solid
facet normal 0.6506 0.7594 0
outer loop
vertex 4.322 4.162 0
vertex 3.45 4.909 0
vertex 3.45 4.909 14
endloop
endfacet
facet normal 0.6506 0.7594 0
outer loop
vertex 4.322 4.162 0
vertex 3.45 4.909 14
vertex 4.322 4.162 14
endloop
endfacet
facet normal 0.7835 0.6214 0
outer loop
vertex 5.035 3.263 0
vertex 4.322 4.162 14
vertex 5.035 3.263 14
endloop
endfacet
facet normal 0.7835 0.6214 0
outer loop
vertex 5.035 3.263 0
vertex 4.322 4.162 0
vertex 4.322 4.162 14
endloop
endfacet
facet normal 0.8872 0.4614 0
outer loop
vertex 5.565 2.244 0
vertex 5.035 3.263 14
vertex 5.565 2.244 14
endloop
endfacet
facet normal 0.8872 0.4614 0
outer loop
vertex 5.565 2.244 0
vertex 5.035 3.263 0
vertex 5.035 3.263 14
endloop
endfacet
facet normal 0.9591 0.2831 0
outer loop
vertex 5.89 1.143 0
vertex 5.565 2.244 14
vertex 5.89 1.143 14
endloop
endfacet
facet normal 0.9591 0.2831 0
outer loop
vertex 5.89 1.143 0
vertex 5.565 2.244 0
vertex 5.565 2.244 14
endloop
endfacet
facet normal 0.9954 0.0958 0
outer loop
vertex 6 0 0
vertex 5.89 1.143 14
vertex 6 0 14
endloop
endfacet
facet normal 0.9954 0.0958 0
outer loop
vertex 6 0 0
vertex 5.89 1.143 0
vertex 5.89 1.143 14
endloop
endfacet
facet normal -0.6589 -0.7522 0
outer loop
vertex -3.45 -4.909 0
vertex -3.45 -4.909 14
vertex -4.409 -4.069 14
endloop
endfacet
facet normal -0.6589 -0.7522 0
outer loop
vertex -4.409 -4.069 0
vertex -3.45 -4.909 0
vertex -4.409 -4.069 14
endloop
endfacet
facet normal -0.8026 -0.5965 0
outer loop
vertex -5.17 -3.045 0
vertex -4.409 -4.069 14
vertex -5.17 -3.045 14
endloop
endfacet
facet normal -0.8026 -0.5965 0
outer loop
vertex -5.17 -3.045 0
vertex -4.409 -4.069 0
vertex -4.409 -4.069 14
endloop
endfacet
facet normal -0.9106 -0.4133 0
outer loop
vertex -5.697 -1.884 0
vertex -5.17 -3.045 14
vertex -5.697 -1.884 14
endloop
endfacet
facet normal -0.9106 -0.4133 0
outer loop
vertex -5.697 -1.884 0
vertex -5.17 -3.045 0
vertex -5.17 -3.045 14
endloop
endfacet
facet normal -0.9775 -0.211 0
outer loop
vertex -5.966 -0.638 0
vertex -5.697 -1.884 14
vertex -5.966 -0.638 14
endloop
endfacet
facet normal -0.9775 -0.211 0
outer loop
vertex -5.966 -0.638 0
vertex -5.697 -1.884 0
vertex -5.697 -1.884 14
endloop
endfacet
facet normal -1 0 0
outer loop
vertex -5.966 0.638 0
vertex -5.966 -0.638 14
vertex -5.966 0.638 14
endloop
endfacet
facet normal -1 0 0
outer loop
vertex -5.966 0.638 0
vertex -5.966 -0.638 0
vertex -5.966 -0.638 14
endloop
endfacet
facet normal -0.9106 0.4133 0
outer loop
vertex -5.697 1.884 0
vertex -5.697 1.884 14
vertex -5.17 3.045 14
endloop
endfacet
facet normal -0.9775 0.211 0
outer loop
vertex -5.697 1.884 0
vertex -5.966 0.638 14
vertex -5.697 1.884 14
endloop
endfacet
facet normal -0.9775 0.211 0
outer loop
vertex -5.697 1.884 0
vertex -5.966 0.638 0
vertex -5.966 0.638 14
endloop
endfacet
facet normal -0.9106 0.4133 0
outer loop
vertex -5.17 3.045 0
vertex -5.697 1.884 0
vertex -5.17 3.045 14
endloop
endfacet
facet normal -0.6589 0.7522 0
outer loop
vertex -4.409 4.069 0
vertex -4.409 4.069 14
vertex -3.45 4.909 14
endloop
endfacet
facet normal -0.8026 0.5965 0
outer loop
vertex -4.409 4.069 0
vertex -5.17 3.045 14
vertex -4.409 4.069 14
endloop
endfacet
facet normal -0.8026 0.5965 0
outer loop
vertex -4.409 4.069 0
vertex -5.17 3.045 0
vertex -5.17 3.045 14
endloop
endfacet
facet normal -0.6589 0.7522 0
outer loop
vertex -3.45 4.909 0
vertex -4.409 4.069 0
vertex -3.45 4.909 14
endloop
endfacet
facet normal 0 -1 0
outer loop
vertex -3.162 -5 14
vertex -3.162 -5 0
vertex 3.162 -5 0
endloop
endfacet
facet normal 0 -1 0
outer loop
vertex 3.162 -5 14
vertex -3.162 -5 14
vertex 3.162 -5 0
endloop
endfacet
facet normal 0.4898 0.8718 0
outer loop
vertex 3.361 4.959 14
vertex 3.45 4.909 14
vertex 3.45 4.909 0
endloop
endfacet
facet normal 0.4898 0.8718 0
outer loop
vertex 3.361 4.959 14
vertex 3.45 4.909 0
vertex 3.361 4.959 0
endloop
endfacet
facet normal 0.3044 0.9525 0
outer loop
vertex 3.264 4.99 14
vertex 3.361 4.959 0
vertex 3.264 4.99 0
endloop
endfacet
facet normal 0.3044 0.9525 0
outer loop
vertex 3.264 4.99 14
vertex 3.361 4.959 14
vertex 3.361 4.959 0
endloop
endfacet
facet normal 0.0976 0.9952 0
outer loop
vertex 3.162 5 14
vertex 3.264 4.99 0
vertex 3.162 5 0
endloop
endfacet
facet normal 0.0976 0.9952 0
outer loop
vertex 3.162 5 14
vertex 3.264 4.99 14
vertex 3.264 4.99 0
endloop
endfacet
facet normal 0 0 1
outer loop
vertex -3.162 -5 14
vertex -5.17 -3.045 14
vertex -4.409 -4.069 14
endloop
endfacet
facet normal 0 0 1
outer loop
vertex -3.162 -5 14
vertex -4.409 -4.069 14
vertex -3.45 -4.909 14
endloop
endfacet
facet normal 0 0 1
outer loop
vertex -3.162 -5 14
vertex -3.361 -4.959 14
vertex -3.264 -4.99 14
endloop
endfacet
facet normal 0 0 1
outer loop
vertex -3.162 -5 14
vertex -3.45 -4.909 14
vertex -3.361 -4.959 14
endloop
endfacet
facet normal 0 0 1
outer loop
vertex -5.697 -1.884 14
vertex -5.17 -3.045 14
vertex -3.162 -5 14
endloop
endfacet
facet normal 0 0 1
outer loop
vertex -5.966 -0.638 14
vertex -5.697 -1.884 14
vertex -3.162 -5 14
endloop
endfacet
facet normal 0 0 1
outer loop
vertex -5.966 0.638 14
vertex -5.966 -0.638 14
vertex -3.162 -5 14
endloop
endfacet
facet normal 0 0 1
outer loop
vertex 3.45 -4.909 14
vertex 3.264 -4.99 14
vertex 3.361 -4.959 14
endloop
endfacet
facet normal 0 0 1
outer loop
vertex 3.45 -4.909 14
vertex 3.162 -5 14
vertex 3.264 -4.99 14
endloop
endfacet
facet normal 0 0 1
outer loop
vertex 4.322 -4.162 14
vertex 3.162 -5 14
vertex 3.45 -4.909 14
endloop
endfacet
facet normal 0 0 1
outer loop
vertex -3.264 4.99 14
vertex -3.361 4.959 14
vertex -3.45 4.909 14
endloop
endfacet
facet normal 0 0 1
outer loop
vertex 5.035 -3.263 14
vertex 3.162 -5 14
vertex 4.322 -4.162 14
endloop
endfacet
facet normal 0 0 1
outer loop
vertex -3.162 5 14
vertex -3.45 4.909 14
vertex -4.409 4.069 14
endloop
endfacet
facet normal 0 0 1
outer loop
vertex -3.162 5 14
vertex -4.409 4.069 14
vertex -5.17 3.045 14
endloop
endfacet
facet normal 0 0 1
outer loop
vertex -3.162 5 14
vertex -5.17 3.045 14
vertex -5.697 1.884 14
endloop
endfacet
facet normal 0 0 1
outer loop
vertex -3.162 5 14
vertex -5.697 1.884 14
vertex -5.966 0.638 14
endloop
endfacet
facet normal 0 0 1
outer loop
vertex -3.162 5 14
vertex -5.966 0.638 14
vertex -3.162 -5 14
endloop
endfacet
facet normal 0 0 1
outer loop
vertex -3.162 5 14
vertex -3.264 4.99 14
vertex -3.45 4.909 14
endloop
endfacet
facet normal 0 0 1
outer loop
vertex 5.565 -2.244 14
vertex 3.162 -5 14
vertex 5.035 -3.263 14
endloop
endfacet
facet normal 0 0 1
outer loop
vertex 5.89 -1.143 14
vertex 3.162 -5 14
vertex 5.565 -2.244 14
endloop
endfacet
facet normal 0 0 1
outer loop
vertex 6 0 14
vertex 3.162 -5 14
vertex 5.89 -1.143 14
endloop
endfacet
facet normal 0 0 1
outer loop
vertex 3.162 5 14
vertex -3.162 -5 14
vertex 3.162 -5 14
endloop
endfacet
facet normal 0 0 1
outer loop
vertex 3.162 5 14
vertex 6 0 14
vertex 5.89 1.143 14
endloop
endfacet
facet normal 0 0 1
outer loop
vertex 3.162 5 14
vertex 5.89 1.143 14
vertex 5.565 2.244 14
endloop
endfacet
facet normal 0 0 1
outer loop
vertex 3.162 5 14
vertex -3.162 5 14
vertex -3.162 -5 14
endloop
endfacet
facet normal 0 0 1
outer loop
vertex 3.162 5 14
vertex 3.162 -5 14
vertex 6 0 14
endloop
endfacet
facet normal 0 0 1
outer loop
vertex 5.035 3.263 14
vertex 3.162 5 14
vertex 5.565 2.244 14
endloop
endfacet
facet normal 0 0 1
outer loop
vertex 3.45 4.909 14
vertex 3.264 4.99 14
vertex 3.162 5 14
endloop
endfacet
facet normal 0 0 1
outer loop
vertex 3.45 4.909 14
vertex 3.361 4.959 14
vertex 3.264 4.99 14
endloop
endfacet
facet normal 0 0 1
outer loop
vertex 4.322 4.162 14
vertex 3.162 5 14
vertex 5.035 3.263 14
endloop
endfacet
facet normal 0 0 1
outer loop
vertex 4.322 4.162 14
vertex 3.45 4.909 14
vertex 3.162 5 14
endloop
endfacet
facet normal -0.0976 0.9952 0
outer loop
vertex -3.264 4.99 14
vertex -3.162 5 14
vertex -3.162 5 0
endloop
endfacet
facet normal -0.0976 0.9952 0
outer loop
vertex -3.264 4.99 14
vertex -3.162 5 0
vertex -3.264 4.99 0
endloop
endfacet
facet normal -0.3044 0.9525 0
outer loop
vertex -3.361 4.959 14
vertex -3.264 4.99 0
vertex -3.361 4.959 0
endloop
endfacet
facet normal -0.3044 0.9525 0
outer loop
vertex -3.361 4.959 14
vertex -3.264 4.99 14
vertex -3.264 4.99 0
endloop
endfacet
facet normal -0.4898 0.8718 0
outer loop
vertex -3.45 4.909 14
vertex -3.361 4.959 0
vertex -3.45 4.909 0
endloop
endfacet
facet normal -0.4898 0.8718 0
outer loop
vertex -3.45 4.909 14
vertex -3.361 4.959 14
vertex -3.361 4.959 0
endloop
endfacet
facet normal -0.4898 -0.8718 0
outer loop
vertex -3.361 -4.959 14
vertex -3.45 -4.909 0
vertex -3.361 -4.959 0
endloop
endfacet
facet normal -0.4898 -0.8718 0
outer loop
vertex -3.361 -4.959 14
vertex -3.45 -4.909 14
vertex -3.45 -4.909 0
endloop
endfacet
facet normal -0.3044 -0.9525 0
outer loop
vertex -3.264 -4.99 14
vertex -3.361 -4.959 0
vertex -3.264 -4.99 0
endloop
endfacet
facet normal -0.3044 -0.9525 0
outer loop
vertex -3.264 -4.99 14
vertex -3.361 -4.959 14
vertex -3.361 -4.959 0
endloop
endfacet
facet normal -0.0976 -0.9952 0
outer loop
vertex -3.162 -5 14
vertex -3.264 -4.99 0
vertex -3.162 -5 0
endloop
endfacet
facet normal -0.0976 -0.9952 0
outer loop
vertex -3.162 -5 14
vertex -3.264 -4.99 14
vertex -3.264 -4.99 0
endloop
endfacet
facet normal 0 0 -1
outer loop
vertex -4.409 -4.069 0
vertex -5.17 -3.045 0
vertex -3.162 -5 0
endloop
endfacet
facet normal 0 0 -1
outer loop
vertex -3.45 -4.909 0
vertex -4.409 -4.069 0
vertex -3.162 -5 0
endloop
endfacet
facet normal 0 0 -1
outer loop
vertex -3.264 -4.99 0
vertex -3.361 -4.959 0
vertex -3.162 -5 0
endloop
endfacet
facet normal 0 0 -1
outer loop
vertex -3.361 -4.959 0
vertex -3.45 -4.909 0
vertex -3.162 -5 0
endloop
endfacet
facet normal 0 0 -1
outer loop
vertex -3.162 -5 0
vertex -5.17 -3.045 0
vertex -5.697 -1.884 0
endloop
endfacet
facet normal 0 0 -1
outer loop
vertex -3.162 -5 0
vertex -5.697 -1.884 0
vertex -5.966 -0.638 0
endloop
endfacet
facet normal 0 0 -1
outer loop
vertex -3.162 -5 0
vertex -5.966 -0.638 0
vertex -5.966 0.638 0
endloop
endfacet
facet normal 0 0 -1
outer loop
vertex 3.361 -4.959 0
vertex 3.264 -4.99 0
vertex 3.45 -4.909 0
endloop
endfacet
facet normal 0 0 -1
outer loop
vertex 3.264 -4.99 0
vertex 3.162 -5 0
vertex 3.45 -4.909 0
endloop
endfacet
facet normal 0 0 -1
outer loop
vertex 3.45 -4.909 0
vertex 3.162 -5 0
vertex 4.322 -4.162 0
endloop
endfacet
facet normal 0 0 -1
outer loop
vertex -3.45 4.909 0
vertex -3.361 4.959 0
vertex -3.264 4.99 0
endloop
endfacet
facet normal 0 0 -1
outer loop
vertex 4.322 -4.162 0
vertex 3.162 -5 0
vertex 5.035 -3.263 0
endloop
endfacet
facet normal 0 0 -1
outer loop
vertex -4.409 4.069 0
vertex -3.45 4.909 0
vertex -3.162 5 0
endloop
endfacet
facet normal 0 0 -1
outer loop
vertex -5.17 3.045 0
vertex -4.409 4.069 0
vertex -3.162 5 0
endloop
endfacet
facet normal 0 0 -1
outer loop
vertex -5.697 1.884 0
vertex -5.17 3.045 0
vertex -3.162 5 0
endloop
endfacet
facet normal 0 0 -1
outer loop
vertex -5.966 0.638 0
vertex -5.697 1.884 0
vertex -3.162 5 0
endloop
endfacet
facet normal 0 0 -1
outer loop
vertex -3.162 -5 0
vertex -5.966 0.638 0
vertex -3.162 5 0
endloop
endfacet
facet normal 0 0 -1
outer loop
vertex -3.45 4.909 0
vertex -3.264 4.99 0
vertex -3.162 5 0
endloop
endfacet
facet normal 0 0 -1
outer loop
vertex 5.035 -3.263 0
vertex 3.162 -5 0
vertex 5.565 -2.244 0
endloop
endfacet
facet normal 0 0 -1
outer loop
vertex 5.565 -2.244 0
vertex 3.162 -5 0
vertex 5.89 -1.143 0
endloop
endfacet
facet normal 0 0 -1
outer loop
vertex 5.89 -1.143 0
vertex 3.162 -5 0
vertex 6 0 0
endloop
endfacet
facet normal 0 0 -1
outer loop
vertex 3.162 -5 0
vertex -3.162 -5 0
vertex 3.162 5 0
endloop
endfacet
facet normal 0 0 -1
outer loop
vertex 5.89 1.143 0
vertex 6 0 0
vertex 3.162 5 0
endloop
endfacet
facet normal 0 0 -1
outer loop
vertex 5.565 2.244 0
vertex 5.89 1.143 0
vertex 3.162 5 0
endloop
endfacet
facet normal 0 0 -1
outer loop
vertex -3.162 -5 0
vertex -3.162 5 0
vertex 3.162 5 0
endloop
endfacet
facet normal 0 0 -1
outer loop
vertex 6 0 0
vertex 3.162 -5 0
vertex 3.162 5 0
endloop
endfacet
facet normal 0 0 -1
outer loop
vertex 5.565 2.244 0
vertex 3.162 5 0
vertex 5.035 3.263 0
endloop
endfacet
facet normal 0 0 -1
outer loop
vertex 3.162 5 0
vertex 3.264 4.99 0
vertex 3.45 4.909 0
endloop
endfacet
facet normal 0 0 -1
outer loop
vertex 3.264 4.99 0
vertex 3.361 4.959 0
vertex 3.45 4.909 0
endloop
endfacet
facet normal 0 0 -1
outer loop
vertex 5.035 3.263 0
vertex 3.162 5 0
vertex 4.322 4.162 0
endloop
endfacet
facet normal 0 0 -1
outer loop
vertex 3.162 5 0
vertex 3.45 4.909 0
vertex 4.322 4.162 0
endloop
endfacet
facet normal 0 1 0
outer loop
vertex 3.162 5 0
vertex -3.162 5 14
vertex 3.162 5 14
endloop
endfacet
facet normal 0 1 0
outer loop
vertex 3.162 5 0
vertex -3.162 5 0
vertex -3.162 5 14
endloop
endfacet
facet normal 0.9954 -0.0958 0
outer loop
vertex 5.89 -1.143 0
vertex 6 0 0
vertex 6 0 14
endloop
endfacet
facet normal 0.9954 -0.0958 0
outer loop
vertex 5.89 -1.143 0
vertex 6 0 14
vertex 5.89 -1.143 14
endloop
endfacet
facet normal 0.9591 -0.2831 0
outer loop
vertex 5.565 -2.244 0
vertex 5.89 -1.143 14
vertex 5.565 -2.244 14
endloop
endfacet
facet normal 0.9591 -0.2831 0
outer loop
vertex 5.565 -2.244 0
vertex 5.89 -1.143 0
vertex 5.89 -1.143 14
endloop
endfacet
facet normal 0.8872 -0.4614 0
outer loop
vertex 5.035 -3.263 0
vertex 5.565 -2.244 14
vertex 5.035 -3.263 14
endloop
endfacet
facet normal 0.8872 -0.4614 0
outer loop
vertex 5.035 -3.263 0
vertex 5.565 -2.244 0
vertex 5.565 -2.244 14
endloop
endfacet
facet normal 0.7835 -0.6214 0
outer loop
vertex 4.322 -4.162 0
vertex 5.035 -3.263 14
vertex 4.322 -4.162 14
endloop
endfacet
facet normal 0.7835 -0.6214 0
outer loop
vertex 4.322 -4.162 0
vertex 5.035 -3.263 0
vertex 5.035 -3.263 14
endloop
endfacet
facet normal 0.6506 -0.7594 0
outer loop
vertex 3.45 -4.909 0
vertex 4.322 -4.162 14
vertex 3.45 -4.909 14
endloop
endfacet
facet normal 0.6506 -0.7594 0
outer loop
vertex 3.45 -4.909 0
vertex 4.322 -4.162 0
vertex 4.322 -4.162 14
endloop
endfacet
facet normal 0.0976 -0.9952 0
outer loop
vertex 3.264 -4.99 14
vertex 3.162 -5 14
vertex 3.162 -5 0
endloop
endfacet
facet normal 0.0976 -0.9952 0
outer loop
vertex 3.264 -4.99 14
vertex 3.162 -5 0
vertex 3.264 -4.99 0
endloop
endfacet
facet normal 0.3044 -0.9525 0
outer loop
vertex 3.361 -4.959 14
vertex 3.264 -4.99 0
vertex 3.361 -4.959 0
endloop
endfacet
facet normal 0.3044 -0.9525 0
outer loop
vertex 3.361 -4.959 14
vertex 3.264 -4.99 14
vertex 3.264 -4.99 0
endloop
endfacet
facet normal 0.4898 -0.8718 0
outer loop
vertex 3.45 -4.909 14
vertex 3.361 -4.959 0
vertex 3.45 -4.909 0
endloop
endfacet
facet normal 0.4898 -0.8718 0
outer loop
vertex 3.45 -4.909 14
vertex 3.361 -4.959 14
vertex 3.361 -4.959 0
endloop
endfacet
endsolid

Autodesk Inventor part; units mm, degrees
ref_plane "YZ Plane" through (0, 0, 0) normal (1, 0, 0) x (0, 1, 0)
ref_plane "XZ Plane" through (0, 0, 0) normal (0, 1, 0) x (-1, 0, 0)
ref_plane "XY Plane" through (0, 0, 0) normal (0, 0, 1) x (1, 0, 0)
sketch "Esquisse1" plane through (0, 0, 0) normal (0, 0, 1) x (1, 0, 0)
  circle A0 centre (0, 0) radius 6
  line L0 (-3.3166, 5) -> (3.3166, 5)
  line L1 (-3.3166, -5) -> (3.3166, -5)
  dimension "d0" = 12
  dimension "d1" = 10
  dimension "d2" = 5
extrude "Extrusion1" add sketch "Esquisse1" along normal blind 14 contours A0 L1 L0
fillet "Congé1" radius 0.5 4 edges at (3.3166, 5, 7) (-3.3166, 5, 7) (3.3166, -5, 7) (-3.3166, -5, 7)
equation "\"d2\" = 0.5 * d1"
properties part number "moteur" material "Acier"
